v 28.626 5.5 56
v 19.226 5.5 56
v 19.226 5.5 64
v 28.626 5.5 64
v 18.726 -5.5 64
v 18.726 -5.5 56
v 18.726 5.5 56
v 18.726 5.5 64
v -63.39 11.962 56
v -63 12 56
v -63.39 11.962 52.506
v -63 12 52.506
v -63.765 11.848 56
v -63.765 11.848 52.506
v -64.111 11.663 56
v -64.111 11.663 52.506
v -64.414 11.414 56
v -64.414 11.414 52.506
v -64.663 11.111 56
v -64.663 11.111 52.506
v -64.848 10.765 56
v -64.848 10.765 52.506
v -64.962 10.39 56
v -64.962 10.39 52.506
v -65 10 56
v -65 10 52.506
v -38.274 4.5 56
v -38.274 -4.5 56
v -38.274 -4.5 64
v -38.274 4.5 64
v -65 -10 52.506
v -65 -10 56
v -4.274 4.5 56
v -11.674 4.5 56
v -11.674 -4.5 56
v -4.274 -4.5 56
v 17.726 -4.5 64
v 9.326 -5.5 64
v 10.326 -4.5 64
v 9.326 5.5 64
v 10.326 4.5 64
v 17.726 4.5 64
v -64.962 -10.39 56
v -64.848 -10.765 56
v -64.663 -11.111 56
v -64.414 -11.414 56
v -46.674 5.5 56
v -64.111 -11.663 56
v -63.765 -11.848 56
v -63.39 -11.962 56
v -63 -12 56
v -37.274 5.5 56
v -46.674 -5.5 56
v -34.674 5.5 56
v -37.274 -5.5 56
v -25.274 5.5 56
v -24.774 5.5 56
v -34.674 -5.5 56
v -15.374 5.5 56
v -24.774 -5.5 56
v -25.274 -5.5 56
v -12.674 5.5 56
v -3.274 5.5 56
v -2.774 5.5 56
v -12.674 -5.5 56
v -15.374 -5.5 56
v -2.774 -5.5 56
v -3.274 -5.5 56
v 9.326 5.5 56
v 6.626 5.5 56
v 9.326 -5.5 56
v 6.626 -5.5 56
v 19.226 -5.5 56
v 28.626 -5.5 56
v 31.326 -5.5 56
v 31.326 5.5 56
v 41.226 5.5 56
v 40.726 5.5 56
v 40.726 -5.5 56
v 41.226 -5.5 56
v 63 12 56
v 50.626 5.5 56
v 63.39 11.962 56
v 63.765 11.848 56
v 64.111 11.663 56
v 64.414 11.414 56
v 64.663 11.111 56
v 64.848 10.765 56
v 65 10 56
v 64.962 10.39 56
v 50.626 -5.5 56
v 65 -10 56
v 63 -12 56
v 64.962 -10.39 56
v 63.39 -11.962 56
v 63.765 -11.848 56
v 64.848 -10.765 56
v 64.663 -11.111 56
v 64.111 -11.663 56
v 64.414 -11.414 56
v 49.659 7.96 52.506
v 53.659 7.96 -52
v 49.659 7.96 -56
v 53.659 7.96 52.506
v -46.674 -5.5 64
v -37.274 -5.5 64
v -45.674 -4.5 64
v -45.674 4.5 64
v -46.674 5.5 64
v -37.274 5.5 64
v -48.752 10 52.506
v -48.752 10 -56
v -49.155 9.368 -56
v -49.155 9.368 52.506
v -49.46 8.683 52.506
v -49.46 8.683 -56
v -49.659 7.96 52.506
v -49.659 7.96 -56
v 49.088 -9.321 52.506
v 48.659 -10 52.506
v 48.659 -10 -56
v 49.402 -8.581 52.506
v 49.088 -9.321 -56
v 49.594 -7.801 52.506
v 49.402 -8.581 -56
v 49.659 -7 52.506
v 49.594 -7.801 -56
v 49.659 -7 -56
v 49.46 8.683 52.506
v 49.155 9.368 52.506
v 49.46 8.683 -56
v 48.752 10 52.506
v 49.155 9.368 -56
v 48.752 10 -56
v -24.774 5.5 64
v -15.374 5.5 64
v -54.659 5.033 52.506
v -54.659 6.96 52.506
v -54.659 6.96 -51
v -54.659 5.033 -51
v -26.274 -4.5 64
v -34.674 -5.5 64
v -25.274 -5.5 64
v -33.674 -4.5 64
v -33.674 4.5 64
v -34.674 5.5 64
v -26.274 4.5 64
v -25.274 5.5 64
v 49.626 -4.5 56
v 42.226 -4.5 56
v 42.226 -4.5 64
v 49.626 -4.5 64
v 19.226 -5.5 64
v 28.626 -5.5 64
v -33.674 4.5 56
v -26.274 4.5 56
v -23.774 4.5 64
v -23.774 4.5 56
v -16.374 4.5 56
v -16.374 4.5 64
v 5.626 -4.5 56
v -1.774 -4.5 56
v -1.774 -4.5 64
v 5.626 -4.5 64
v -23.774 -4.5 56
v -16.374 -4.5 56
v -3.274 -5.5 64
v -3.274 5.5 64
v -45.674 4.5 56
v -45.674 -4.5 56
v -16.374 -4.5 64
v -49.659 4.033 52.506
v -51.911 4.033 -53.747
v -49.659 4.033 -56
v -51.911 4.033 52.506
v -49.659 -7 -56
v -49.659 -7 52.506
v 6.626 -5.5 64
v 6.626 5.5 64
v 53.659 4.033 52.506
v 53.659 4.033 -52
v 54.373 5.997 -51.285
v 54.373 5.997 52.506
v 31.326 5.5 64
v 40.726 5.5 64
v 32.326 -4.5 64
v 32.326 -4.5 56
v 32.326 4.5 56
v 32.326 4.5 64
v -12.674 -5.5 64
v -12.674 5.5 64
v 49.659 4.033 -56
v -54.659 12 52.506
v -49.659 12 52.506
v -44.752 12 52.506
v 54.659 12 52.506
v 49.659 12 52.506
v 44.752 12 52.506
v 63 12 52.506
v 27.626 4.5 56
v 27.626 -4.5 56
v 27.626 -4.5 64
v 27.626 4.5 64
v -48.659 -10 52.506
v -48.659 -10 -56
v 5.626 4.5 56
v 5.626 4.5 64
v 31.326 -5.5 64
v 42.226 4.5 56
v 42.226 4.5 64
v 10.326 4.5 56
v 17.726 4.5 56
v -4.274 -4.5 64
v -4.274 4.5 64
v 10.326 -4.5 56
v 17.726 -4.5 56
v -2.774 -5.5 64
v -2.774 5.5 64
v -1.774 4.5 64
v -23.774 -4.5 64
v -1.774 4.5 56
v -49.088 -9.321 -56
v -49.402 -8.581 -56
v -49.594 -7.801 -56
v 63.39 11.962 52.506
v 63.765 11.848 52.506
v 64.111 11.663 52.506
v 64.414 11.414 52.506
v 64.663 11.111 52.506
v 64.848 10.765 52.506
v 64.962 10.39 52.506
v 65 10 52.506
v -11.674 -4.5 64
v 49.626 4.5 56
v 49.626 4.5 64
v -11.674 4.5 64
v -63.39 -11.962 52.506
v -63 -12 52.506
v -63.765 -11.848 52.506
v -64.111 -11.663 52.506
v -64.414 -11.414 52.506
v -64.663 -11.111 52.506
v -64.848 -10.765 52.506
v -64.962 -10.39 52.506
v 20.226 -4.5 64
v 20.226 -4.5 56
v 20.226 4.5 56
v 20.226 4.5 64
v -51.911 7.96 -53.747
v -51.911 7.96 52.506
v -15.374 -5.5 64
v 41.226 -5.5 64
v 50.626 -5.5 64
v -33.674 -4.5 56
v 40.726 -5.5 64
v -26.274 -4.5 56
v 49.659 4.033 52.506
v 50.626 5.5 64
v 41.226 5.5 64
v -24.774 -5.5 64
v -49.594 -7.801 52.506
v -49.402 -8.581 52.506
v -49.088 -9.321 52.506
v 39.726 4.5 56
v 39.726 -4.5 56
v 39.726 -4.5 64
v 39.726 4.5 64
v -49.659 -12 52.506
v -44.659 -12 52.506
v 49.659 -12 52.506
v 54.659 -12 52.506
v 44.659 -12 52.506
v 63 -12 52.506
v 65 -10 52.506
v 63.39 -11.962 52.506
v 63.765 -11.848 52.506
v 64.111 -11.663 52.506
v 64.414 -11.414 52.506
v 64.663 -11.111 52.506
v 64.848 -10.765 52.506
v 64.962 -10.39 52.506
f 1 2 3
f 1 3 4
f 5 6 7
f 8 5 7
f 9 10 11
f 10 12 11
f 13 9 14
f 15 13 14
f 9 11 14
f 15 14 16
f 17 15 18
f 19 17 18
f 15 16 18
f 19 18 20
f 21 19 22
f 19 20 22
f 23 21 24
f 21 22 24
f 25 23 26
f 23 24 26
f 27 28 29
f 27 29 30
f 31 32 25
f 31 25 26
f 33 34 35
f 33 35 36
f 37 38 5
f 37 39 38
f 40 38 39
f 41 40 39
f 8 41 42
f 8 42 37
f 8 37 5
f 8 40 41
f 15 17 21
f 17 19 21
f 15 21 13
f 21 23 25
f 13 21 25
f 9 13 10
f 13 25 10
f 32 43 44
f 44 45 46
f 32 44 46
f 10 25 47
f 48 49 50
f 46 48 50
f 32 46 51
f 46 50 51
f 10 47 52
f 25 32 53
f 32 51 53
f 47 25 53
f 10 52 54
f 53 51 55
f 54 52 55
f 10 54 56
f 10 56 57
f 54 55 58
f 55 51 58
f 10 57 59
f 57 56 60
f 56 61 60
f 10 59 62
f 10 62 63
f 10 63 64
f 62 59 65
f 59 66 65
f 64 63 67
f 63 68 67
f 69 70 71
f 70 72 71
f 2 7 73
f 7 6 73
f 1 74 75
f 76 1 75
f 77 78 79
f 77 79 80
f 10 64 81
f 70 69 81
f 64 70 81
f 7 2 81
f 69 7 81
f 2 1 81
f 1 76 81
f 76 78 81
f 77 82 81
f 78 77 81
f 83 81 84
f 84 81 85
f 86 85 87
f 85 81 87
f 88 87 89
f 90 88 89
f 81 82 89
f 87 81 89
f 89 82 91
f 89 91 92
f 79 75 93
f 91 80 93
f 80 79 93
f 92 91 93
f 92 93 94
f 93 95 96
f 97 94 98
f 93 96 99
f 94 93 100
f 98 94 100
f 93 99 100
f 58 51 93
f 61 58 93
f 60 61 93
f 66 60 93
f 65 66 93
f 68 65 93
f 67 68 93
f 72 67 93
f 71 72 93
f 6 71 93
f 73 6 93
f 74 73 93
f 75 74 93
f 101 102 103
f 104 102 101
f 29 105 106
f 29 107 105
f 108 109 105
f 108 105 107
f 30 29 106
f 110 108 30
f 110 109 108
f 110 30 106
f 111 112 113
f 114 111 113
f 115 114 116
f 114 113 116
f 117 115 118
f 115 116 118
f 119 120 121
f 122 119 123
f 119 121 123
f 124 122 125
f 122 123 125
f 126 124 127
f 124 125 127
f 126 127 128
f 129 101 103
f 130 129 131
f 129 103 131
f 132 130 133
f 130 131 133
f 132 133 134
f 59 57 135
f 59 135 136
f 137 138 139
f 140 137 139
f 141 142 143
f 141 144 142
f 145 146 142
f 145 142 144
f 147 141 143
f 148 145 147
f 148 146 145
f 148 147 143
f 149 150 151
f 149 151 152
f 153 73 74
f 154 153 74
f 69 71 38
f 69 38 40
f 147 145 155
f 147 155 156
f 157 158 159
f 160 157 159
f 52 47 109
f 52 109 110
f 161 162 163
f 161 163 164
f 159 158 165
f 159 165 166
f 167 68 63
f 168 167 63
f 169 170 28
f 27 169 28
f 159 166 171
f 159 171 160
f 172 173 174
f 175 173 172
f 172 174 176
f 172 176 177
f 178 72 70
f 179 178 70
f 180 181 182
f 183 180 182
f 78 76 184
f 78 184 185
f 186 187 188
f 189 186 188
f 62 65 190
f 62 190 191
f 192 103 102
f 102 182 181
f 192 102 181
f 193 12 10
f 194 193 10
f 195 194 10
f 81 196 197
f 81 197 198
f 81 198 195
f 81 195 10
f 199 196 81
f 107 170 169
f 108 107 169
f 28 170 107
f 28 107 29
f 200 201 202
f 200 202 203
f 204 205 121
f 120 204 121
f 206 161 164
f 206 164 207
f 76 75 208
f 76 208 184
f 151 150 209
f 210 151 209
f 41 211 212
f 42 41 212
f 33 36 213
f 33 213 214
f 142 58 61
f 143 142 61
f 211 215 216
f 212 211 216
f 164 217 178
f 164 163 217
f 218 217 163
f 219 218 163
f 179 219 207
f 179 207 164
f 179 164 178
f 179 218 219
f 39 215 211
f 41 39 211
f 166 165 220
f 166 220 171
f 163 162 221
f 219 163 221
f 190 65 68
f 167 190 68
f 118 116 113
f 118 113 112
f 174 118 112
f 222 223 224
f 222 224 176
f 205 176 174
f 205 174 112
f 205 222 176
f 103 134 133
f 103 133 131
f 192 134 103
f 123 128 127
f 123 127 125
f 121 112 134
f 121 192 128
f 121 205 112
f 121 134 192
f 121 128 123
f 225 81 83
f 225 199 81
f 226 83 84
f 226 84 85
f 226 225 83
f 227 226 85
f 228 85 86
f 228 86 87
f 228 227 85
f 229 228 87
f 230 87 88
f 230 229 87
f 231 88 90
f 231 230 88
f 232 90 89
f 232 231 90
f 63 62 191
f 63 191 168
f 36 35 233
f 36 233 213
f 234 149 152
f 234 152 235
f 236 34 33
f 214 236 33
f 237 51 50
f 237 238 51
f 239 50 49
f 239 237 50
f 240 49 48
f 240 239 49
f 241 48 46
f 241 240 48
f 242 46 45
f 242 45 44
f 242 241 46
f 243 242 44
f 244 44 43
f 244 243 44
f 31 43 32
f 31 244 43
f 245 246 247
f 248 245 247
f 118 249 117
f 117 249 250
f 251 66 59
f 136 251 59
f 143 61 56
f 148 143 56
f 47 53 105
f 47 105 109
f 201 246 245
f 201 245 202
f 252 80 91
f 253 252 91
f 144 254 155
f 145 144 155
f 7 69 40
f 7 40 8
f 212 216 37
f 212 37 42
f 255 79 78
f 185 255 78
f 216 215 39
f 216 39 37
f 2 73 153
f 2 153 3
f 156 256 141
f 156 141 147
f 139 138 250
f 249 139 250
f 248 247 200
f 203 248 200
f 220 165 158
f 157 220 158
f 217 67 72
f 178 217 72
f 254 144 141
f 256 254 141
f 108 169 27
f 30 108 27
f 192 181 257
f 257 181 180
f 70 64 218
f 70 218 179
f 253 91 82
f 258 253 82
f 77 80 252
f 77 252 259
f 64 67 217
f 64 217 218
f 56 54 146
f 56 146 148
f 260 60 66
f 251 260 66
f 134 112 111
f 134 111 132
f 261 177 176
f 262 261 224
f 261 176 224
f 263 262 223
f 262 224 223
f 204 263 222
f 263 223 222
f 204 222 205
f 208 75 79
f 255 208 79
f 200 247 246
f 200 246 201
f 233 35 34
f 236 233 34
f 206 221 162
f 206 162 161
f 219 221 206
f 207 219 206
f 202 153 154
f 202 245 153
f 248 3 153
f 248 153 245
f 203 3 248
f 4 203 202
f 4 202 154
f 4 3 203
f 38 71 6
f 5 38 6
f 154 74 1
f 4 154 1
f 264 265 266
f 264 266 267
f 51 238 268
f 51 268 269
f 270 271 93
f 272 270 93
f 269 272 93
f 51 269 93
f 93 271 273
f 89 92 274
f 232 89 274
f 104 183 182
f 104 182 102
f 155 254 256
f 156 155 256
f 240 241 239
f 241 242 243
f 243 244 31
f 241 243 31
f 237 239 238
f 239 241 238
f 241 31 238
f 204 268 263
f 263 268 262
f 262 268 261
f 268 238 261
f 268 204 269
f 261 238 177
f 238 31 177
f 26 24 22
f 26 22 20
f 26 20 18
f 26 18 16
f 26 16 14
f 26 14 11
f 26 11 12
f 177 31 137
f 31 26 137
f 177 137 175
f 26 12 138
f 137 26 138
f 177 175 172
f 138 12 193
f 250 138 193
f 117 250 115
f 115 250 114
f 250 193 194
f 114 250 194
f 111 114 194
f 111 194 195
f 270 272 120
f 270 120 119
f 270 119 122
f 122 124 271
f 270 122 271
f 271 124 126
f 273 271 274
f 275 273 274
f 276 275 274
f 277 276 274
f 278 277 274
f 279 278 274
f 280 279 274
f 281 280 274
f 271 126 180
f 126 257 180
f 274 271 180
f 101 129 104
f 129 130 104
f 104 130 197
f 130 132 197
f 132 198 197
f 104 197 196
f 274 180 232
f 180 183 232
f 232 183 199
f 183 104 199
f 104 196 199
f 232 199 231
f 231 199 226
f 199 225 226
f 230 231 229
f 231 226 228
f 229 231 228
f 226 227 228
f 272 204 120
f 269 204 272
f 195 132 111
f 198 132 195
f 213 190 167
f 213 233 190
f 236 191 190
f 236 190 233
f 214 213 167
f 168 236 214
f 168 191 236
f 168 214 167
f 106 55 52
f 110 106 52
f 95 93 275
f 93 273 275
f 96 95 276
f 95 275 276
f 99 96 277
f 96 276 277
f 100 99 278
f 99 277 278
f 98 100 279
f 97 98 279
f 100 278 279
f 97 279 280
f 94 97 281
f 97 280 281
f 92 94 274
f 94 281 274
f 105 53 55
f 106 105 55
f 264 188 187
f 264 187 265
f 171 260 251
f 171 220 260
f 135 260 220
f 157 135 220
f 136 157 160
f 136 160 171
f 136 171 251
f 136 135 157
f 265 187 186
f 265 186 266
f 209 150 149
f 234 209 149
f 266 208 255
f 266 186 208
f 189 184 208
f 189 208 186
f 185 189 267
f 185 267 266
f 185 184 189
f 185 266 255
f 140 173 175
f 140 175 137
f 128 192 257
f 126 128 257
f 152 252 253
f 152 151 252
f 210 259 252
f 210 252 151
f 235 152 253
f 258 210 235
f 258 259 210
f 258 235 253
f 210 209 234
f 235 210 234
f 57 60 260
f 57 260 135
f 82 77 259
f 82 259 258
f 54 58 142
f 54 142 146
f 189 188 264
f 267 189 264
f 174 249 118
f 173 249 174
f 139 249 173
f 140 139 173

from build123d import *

# Parameters (mm, degrees)
EXTRUDE_1_DEPTH      = 12
EXTRUDE_1_DEPTH_BACK = 12
SKETCH_1_W           = 130
SKETCH_1_H           = 112
SKETCH_2_W           = 10.341275007
SKETCH_2_H           = 108.506204724
CUT_EXTRUDE_1_DEPTH  = 90.089842294
SKETCH_3_W           = 108.506204724
SKETCH_3_H           = 4.039795579
SKETCH_3_H_2         = 16.032937215
CUT_EXTRUDE_2_DEPTH  = 5
CHAMFER_1_SIZE       = 5
FILLET_1_R           = 5
CHAMFER_2_SIZE       = 2.747477419
CHAMFER_2_SIZE_2     = 1
FILLET_2_R           = 2
SKETCH_4_W           = 9.4
SKETCH_4_H           = 11
SKETCH_4_W_2         = 7.4
SKETCH_4_H_2         = 9
EXTRUDE_2_DEPTH      = 8
SKETCH_5_W           = 122.805441914
SKETCH_5_H           = 111.758877205
CUT_EXTRUDE_3_DEPTH  = 2


with BuildPart() as part:
    # 草图1 → 凸台-拉伸1 (new, two sides: drawn at the far end of the back side and taken through both)
    with BuildSketch(Plane(origin=(0, 0, 0), x_dir=(1, 0, 0), z_dir=(0, 1, 0)).offset(-EXTRUDE_1_DEPTH_BACK)):
        Rectangle(SKETCH_1_W, SKETCH_1_H)
    extrude(amount=EXTRUDE_1_DEPTH + EXTRUDE_1_DEPTH_BACK)

    # 草图2 → 切除-拉伸1 (cut, through all)
    with BuildSketch(Plane(origin=(0, 12, 0), x_dir=(1, 0, 0), z_dir=(0, 1, 0))):
        with Locations((59.829362496, 1.746897638)):
            Rectangle(SKETCH_2_W, SKETCH_2_H)
        with Locations((-59.829362496, 1.746897638)):
            Rectangle(SKETCH_2_W, SKETCH_2_H)
    extrude(amount=-CUT_EXTRUDE_1_DEPTH, mode=Mode.SUBTRACT)

    # 草图3 → 切除-拉伸2 (cut)
    with BuildSketch(Plane.ZY.offset(54.658724993)):
        with Locations((-1.746897638, 9.980102211)):
            Rectangle(SKETCH_3_W, SKETCH_3_H)
        with Locations((-1.746897638, -3.983531392)):
            Rectangle(SKETCH_3_W, SKETCH_3_H_2)
    cut_extrude_2 = extrude(amount=-CUT_EXTRUDE_2_DEPTH, mode=Mode.SUBTRACT)

    # 镜向1: 切除-拉伸2 across plane
    add(cut_extrude_2.mirror(Plane(origin=(0, 0, 0), x_dir=(0, 0, 1), z_dir=(1, 0, 0))), mode=Mode.SUBTRACT)

    # 倒角1
    chamfer_1_edges = [part.edges().sort_by_distance(p)[0] for p in [
        (-54.658724993, 5.996570818, -56),
        (54.658724993, 5.996570818, -56),
    ]]
    chamfer(chamfer_1_edges, length=CHAMFER_1_SIZE)

    # 圆角1
    # the kernel refuses this fillet: 5 mm, written as the material it takes off along each edge
    with BuildSketch(Plane(origin=(-49.658724993, 12, -68.267336577), x_dir=(0, -1, 0), z_dir=(0, 0, 1))) as fillet_1_piece_1:
        with BuildLine():
            CenterArc((5, 4.906934631), FILLET_1_R, 180, 78.928088112)
            Line((0, 4.906934631), (0, 0))
            Line((0, 0), (4.039795579, 0))
        make_face()
    extrude(amount=120.773541301, mode=Mode.SUBTRACT)
    with BuildSketch(Plane(origin=(-49.658724993, -12, -68.5), x_dir=(0, 1, 0), z_dir=(0, 0, 1)), Plane(origin=(49.658724993, -12, -68.5), x_dir=(-1, 0, 0), z_dir=(0, 0, 1))) as fillet_1_piece_2:
        with BuildLine():
            CenterArc((FILLET_1_R, -FILLET_1_R), FILLET_1_R, 90, 90)
            Line((0, -FILLET_1_R), (0, 0))
            Line((0, 0), (FILLET_1_R, 0))
        make_face()
    extrude(amount=121.006204724, mode=Mode.SUBTRACT)
    with BuildSketch(Plane(origin=(49.658724993, 12, -68.267336577), x_dir=(-1, 0, 0), z_dir=(0, 0, 1))) as fillet_1_piece_3:
        with BuildLine():
            CenterArc((4.906934631, 5), FILLET_1_R, 191.071911888, 78.928088112)
            Line((0, 4.039795579), (0, 0))
            Line((0, 0), (4.906934631, 0))
        make_face()
    extrude(amount=120.773541301, mode=Mode.SUBTRACT)

    # 倒角2
    # the kernel refuses this chamfer: 2.747477419, 1 mm, written as the material it takes off along each edge
    with BuildSketch(Plane(origin=(54.658724993, 7.960204421, 52.506204724), x_dir=(0.013184058198646324, -0.9999130865277316, 0), z_dir=(0, 0, -1))) as chamfer_2_piece_1:
        Polygon((CHAMFER_2_SIZE * 0.999913086693, CHAMFER_2_SIZE * 0.0131840582008), (-CHAMFER_2_SIZE_2 * 0.0131840581986, CHAMFER_2_SIZE_2 * 0.999913086528), (0, 0), align=None)
    extrude(amount=110.633696174, mode=Mode.SUBTRACT)
    with BuildSketch(Plane(origin=(54.658724993, 4.032937215, 52.506204724), x_dir=(-0.9950833631817486, -0.09904090225205064, 0), z_dir=(0, 0, -1))) as chamfer_2_piece_2:
        Polygon((CHAMFER_2_SIZE_2 * 0.995083363182, CHAMFER_2_SIZE_2 * 0.0990409022521), (-CHAMFER_2_SIZE * 0.0990409022684, CHAMFER_2_SIZE * 0.995083363346), (0, 0), align=None)
    extrude(amount=110.633696174, mode=Mode.SUBTRACT)
    with BuildSketch(Plane(origin=(-54.658724993, 4.032937215, 52.506204724), x_dir=(0.9999130865277316, -0.013184058198645857, 0), z_dir=(0, 0, -1))) as chamfer_2_piece_3:
        Polygon((CHAMFER_2_SIZE * 0.999913086693, -CHAMFER_2_SIZE * 0.0131840582008), (-CHAMFER_2_SIZE_2 * 0.0131840581986, -CHAMFER_2_SIZE_2 * 0.999913086528), (0, 0), align=None)
    extrude(amount=110.633696174, mode=Mode.SUBTRACT)
    with BuildSketch(Plane(origin=(-54.658724993, 7.960204421, 52.506204724), x_dir=(-0.09904090225204956, -0.9950833631817488, 0), z_dir=(0, 0, -1))) as chamfer_2_piece_4:
        Polygon((CHAMFER_2_SIZE_2 * 0.995083363182, -CHAMFER_2_SIZE_2 * 0.099040902252), (-CHAMFER_2_SIZE * 0.0990409022684, -CHAMFER_2_SIZE * 0.995083363346), (0, 0), align=None)
    extrude(amount=110.633696174, mode=Mode.SUBTRACT)

    # 圆角2
    fillet_2_edges = [part.edges().sort_by_distance(p)[0] for p in [
        (65, -12, 54.253102362),
        (65, 12, 54.253102362),
        (-65, 12, 54.253102362),
        (-65, -12, 54.253102362),
    ]]
    fillet(fillet_2_edges, radius=FILLET_2_R)

    # 草图4 → 凸台-拉伸2 (add)
    # profile 1 of 9: a face of its own
    with BuildSketch(Plane.XY.offset(56)):
        with Locations((-29.973556768, 0)):
            Rectangle(SKETCH_4_W, SKETCH_4_H)
        with Locations((-29.973556768, 0)):
            Rectangle(SKETCH_4_W_2, SKETCH_4_H_2, mode=Mode.SUBTRACT)
    # profile 2 of 9: a face of its own
    with BuildSketch(Plane.XY.offset(56)):
        with Locations((-41.973556768, 0)):
            Rectangle(SKETCH_4_W, SKETCH_4_H)
        with Locations((-41.973556768, 0)):
            Rectangle(SKETCH_4_W_2, SKETCH_4_H_2, mode=Mode.SUBTRACT)
    # profile 3 of 9: a face of its own
    with BuildSketch(Plane.XY.offset(56)):
        with Locations((-20.073556768, 0)):
            Rectangle(SKETCH_4_W, SKETCH_4_H)
        with Locations((-20.073556768, 0)):
            Rectangle(SKETCH_4_W_2, SKETCH_4_H_2, mode=Mode.SUBTRACT)
    # profile 4 of 9: a face of its own
    with BuildSketch(Plane.XY.offset(56)):
        with Locations((-7.973556768, 0)):
            Rectangle(SKETCH_4_W, SKETCH_4_H)
        with Locations((-7.973556768, 0)):
            Rectangle(SKETCH_4_W_2, SKETCH_4_H_2, mode=Mode.SUBTRACT)
    # profile 5 of 9: a face of its own
    with BuildSketch(Plane.XY.offset(56)):
        with Locations((1.926443232, 0)):
            Rectangle(SKETCH_4_W, SKETCH_4_H)
        with Locations((1.926443232, 0)):
            Rectangle(SKETCH_4_W_2, SKETCH_4_H_2, mode=Mode.SUBTRACT)
    # profile 6 of 9: a face of its own
    with BuildSketch(Plane.XY.offset(56)):
        with Locations((14.026443232, 0)):
            Rectangle(SKETCH_4_W, SKETCH_4_H)
        with Locations((14.026443232, 0)):
            Rectangle(SKETCH_4_W_2, SKETCH_4_H_2, mode=Mode.SUBTRACT)
    # profile 7 of 9: a face of its own
    with BuildSketch(Plane.XY.offset(56)):
        with Locations((23.926443232, 0)):
            Rectangle(SKETCH_4_W, SKETCH_4_H)
        with Locations((23.926443232, 0)):
            Rectangle(SKETCH_4_W_2, SKETCH_4_H_2, mode=Mode.SUBTRACT)
    # profile 8 of 9: a face of its own
    with BuildSketch(Plane.XY.offset(56)):
        with Locations((36.026443232, 0)):
            Rectangle(SKETCH_4_W, SKETCH_4_H)
        with Locations((36.026443232, 0)):
            Rectangle(SKETCH_4_W_2, SKETCH_4_H_2, mode=Mode.SUBTRACT)
    # profile 9 of 9: a face of its own
    with BuildSketch(Plane.XY.offset(56)):
        with Locations((45.926443232, 0)):
            Rectangle(SKETCH_4_W, SKETCH_4_H)
        with Locations((45.926443232, 0)):
            Rectangle(SKETCH_4_W_2, SKETCH_4_H_2, mode=Mode.SUBTRACT)
    extrude(amount=EXTRUDE_2_DEPTH)

    # 草图5 → 切除-拉伸3 (cut)
    with BuildSketch(Plane(origin=(0, 12, 0), x_dir=(1, 0, 0), z_dir=(0, 1, 0))):
        with Locations((1.597279043, 3.373233879)):
            Rectangle(SKETCH_5_W, SKETCH_5_H)
    cut_extrude_3 = extrude(amount=-CUT_EXTRUDE_3_DEPTH, mode=Mode.SUBTRACT)

    # 镜向2: 切除-拉伸3 across plane
    add(cut_extrude_3.mirror(Plane.ZX), mode=Mode.SUBTRACT)


solid = part.part
